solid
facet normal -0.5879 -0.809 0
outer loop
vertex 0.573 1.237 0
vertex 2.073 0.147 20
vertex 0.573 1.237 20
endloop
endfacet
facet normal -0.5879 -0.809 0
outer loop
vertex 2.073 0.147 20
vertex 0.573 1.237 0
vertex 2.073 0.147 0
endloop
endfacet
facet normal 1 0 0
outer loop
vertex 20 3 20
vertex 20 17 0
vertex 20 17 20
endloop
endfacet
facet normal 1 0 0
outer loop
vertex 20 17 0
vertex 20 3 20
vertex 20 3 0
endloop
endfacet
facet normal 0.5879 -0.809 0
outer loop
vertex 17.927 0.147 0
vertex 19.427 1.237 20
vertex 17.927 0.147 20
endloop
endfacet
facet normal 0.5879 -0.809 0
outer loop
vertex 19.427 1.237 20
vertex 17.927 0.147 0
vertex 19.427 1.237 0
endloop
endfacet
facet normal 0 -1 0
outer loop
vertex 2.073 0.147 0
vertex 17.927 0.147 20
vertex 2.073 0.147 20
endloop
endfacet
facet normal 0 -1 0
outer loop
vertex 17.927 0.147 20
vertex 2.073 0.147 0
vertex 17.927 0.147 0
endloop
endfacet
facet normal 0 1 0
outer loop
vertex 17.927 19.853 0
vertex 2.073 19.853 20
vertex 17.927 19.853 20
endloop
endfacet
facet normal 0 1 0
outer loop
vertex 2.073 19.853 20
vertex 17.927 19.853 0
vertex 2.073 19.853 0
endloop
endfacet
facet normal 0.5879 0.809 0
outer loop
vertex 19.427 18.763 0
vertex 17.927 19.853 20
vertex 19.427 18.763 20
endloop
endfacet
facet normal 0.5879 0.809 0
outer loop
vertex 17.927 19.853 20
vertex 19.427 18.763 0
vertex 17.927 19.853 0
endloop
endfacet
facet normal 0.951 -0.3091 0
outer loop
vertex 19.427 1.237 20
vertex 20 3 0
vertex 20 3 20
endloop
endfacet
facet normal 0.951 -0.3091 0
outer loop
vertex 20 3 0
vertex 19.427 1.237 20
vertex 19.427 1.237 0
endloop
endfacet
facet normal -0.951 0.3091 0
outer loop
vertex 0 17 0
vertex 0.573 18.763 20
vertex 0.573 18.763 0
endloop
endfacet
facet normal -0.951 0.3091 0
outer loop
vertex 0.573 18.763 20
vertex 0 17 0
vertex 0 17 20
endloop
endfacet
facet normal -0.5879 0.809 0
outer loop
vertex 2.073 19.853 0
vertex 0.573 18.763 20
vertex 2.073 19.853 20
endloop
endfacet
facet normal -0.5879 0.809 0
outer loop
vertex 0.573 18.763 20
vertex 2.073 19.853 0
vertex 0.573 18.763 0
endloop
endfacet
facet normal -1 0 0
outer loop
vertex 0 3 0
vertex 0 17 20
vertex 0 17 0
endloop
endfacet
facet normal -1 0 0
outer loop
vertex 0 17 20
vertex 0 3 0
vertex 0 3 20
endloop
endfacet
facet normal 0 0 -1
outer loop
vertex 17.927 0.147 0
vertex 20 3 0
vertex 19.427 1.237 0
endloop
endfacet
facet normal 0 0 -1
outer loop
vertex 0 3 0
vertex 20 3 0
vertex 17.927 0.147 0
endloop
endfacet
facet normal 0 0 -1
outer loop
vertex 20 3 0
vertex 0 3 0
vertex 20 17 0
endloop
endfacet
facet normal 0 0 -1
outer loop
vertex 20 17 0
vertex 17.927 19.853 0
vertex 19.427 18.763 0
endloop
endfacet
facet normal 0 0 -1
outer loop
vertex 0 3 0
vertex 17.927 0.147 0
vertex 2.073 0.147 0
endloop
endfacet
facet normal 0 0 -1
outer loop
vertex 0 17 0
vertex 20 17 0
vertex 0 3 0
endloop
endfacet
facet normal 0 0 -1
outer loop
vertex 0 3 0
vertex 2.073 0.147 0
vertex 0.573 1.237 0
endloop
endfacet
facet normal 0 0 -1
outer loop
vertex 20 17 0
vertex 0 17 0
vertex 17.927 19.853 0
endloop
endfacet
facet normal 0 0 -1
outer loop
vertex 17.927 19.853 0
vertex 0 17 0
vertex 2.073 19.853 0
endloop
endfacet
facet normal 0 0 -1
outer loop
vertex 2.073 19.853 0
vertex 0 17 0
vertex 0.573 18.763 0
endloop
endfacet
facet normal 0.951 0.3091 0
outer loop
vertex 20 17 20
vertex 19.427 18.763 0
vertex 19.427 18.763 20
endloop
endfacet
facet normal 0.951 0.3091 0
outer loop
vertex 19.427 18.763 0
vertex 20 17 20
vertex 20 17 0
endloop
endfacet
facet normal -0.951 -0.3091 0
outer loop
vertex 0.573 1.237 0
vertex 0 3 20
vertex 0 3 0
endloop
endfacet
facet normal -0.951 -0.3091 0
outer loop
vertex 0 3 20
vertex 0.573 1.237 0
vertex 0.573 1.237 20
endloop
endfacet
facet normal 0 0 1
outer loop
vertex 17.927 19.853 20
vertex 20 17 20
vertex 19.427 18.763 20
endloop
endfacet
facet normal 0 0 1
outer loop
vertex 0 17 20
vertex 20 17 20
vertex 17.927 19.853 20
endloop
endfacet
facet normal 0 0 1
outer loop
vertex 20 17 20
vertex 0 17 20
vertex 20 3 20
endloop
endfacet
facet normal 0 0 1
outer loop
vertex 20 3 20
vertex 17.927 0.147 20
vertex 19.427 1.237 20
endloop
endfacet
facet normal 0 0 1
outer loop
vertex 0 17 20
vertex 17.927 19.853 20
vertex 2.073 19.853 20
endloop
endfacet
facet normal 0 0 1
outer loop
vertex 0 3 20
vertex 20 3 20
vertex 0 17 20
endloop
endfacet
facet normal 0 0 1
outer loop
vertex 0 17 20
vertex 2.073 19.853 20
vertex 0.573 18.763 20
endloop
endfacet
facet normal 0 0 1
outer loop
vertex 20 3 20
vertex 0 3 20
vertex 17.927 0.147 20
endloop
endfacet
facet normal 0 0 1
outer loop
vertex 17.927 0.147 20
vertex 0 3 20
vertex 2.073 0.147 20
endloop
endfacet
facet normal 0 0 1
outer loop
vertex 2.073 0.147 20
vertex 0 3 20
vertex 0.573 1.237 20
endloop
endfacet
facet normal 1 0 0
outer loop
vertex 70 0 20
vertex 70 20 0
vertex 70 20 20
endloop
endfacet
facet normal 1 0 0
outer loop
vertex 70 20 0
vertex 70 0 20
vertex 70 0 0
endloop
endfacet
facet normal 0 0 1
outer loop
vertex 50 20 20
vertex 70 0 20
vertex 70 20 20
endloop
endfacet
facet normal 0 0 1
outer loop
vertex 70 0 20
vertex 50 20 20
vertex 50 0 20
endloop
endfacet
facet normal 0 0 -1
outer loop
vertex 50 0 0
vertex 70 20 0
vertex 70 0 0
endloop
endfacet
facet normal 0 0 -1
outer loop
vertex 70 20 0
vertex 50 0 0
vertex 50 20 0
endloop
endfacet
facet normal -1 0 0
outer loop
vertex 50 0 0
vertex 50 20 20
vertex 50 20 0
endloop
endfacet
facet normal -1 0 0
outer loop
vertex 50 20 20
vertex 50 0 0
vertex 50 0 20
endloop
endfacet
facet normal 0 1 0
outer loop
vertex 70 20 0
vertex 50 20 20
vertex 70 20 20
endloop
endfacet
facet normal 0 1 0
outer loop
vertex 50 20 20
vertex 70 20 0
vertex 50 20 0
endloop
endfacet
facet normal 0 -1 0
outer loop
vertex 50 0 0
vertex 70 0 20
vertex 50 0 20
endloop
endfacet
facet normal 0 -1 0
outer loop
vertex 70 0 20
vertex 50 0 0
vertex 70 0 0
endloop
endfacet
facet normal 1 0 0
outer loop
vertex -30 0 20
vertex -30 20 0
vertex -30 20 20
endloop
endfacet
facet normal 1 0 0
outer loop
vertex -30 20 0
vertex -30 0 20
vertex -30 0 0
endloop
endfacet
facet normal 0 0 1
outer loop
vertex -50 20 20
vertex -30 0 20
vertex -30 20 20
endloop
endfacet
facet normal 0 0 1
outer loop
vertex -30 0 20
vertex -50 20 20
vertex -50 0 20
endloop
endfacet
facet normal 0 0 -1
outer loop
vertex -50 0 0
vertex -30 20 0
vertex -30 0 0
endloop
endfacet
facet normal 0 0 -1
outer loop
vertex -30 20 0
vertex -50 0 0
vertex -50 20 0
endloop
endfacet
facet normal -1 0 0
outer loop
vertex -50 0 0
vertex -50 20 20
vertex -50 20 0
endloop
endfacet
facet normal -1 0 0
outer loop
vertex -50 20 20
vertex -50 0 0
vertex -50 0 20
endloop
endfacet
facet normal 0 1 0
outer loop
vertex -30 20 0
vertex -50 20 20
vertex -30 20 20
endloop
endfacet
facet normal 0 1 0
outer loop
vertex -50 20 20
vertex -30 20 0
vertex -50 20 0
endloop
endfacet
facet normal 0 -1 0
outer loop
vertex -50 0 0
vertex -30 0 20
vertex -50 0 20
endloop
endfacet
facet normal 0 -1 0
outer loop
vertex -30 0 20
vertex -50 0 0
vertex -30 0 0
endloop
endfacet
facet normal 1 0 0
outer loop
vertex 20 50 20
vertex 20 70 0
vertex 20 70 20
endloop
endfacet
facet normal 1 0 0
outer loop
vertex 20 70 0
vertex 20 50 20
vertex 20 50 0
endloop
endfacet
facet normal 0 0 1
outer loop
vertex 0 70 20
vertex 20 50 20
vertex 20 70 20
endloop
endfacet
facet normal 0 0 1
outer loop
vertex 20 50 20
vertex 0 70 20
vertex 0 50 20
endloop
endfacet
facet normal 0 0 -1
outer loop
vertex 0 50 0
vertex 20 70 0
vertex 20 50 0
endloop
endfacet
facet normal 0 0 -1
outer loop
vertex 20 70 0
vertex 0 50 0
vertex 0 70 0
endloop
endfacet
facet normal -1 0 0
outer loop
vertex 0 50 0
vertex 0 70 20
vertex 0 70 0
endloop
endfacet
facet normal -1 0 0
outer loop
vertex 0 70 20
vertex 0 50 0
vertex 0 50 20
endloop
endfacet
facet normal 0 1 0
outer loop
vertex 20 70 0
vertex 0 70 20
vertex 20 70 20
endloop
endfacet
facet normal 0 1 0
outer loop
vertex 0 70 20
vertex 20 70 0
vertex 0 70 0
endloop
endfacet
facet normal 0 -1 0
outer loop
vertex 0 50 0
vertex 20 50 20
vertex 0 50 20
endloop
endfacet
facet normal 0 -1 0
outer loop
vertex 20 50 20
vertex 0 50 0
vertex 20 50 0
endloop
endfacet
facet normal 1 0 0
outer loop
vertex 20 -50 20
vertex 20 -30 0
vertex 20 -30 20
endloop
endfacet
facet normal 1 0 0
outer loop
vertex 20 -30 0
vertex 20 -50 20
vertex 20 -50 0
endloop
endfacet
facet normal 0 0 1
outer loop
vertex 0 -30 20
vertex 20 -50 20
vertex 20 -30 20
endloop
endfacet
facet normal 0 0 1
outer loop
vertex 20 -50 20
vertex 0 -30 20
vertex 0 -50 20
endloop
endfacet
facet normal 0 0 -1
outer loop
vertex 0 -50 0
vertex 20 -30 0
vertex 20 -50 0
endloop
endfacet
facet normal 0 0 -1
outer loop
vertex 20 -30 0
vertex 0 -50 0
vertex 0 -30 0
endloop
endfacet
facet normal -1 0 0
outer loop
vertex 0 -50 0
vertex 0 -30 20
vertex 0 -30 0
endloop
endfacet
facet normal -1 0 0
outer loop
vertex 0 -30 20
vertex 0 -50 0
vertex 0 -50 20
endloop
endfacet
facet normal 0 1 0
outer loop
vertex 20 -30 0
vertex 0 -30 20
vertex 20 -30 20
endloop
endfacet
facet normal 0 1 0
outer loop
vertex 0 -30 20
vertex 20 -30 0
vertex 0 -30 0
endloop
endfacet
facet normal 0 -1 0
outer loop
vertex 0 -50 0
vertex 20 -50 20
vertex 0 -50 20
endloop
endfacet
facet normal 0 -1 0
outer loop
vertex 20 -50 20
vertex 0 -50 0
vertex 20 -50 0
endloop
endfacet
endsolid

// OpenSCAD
//cube([20,20,20]);
roundedcube(20,20,20,3);

module roundedcube(xdim ,ydim ,zdim,rdim){
hull(){
translate([rdim,rdim,0])cylinder(h=zdim,r=rdim);
translate([xdim-rdim,rdim,0])cylinder(h=zdim,r=rdim);

translate([rdim,ydim-rdim,0])cylinder(h=zdim,r=rdim);
translate([xdim-rdim,ydim-rdim,0])cylinder(h=zdim,r=rdim);
}
}


translate([50,0,0]) {
  cube([20,20,20]);
}

translate([-50,0,0]) {
  cube([20,20,20]);
}

translate([0,50,0]) {
  cube([20,20,20]);
}
translate([0,-50,0]) {
  cube([20,20,20]);
}
